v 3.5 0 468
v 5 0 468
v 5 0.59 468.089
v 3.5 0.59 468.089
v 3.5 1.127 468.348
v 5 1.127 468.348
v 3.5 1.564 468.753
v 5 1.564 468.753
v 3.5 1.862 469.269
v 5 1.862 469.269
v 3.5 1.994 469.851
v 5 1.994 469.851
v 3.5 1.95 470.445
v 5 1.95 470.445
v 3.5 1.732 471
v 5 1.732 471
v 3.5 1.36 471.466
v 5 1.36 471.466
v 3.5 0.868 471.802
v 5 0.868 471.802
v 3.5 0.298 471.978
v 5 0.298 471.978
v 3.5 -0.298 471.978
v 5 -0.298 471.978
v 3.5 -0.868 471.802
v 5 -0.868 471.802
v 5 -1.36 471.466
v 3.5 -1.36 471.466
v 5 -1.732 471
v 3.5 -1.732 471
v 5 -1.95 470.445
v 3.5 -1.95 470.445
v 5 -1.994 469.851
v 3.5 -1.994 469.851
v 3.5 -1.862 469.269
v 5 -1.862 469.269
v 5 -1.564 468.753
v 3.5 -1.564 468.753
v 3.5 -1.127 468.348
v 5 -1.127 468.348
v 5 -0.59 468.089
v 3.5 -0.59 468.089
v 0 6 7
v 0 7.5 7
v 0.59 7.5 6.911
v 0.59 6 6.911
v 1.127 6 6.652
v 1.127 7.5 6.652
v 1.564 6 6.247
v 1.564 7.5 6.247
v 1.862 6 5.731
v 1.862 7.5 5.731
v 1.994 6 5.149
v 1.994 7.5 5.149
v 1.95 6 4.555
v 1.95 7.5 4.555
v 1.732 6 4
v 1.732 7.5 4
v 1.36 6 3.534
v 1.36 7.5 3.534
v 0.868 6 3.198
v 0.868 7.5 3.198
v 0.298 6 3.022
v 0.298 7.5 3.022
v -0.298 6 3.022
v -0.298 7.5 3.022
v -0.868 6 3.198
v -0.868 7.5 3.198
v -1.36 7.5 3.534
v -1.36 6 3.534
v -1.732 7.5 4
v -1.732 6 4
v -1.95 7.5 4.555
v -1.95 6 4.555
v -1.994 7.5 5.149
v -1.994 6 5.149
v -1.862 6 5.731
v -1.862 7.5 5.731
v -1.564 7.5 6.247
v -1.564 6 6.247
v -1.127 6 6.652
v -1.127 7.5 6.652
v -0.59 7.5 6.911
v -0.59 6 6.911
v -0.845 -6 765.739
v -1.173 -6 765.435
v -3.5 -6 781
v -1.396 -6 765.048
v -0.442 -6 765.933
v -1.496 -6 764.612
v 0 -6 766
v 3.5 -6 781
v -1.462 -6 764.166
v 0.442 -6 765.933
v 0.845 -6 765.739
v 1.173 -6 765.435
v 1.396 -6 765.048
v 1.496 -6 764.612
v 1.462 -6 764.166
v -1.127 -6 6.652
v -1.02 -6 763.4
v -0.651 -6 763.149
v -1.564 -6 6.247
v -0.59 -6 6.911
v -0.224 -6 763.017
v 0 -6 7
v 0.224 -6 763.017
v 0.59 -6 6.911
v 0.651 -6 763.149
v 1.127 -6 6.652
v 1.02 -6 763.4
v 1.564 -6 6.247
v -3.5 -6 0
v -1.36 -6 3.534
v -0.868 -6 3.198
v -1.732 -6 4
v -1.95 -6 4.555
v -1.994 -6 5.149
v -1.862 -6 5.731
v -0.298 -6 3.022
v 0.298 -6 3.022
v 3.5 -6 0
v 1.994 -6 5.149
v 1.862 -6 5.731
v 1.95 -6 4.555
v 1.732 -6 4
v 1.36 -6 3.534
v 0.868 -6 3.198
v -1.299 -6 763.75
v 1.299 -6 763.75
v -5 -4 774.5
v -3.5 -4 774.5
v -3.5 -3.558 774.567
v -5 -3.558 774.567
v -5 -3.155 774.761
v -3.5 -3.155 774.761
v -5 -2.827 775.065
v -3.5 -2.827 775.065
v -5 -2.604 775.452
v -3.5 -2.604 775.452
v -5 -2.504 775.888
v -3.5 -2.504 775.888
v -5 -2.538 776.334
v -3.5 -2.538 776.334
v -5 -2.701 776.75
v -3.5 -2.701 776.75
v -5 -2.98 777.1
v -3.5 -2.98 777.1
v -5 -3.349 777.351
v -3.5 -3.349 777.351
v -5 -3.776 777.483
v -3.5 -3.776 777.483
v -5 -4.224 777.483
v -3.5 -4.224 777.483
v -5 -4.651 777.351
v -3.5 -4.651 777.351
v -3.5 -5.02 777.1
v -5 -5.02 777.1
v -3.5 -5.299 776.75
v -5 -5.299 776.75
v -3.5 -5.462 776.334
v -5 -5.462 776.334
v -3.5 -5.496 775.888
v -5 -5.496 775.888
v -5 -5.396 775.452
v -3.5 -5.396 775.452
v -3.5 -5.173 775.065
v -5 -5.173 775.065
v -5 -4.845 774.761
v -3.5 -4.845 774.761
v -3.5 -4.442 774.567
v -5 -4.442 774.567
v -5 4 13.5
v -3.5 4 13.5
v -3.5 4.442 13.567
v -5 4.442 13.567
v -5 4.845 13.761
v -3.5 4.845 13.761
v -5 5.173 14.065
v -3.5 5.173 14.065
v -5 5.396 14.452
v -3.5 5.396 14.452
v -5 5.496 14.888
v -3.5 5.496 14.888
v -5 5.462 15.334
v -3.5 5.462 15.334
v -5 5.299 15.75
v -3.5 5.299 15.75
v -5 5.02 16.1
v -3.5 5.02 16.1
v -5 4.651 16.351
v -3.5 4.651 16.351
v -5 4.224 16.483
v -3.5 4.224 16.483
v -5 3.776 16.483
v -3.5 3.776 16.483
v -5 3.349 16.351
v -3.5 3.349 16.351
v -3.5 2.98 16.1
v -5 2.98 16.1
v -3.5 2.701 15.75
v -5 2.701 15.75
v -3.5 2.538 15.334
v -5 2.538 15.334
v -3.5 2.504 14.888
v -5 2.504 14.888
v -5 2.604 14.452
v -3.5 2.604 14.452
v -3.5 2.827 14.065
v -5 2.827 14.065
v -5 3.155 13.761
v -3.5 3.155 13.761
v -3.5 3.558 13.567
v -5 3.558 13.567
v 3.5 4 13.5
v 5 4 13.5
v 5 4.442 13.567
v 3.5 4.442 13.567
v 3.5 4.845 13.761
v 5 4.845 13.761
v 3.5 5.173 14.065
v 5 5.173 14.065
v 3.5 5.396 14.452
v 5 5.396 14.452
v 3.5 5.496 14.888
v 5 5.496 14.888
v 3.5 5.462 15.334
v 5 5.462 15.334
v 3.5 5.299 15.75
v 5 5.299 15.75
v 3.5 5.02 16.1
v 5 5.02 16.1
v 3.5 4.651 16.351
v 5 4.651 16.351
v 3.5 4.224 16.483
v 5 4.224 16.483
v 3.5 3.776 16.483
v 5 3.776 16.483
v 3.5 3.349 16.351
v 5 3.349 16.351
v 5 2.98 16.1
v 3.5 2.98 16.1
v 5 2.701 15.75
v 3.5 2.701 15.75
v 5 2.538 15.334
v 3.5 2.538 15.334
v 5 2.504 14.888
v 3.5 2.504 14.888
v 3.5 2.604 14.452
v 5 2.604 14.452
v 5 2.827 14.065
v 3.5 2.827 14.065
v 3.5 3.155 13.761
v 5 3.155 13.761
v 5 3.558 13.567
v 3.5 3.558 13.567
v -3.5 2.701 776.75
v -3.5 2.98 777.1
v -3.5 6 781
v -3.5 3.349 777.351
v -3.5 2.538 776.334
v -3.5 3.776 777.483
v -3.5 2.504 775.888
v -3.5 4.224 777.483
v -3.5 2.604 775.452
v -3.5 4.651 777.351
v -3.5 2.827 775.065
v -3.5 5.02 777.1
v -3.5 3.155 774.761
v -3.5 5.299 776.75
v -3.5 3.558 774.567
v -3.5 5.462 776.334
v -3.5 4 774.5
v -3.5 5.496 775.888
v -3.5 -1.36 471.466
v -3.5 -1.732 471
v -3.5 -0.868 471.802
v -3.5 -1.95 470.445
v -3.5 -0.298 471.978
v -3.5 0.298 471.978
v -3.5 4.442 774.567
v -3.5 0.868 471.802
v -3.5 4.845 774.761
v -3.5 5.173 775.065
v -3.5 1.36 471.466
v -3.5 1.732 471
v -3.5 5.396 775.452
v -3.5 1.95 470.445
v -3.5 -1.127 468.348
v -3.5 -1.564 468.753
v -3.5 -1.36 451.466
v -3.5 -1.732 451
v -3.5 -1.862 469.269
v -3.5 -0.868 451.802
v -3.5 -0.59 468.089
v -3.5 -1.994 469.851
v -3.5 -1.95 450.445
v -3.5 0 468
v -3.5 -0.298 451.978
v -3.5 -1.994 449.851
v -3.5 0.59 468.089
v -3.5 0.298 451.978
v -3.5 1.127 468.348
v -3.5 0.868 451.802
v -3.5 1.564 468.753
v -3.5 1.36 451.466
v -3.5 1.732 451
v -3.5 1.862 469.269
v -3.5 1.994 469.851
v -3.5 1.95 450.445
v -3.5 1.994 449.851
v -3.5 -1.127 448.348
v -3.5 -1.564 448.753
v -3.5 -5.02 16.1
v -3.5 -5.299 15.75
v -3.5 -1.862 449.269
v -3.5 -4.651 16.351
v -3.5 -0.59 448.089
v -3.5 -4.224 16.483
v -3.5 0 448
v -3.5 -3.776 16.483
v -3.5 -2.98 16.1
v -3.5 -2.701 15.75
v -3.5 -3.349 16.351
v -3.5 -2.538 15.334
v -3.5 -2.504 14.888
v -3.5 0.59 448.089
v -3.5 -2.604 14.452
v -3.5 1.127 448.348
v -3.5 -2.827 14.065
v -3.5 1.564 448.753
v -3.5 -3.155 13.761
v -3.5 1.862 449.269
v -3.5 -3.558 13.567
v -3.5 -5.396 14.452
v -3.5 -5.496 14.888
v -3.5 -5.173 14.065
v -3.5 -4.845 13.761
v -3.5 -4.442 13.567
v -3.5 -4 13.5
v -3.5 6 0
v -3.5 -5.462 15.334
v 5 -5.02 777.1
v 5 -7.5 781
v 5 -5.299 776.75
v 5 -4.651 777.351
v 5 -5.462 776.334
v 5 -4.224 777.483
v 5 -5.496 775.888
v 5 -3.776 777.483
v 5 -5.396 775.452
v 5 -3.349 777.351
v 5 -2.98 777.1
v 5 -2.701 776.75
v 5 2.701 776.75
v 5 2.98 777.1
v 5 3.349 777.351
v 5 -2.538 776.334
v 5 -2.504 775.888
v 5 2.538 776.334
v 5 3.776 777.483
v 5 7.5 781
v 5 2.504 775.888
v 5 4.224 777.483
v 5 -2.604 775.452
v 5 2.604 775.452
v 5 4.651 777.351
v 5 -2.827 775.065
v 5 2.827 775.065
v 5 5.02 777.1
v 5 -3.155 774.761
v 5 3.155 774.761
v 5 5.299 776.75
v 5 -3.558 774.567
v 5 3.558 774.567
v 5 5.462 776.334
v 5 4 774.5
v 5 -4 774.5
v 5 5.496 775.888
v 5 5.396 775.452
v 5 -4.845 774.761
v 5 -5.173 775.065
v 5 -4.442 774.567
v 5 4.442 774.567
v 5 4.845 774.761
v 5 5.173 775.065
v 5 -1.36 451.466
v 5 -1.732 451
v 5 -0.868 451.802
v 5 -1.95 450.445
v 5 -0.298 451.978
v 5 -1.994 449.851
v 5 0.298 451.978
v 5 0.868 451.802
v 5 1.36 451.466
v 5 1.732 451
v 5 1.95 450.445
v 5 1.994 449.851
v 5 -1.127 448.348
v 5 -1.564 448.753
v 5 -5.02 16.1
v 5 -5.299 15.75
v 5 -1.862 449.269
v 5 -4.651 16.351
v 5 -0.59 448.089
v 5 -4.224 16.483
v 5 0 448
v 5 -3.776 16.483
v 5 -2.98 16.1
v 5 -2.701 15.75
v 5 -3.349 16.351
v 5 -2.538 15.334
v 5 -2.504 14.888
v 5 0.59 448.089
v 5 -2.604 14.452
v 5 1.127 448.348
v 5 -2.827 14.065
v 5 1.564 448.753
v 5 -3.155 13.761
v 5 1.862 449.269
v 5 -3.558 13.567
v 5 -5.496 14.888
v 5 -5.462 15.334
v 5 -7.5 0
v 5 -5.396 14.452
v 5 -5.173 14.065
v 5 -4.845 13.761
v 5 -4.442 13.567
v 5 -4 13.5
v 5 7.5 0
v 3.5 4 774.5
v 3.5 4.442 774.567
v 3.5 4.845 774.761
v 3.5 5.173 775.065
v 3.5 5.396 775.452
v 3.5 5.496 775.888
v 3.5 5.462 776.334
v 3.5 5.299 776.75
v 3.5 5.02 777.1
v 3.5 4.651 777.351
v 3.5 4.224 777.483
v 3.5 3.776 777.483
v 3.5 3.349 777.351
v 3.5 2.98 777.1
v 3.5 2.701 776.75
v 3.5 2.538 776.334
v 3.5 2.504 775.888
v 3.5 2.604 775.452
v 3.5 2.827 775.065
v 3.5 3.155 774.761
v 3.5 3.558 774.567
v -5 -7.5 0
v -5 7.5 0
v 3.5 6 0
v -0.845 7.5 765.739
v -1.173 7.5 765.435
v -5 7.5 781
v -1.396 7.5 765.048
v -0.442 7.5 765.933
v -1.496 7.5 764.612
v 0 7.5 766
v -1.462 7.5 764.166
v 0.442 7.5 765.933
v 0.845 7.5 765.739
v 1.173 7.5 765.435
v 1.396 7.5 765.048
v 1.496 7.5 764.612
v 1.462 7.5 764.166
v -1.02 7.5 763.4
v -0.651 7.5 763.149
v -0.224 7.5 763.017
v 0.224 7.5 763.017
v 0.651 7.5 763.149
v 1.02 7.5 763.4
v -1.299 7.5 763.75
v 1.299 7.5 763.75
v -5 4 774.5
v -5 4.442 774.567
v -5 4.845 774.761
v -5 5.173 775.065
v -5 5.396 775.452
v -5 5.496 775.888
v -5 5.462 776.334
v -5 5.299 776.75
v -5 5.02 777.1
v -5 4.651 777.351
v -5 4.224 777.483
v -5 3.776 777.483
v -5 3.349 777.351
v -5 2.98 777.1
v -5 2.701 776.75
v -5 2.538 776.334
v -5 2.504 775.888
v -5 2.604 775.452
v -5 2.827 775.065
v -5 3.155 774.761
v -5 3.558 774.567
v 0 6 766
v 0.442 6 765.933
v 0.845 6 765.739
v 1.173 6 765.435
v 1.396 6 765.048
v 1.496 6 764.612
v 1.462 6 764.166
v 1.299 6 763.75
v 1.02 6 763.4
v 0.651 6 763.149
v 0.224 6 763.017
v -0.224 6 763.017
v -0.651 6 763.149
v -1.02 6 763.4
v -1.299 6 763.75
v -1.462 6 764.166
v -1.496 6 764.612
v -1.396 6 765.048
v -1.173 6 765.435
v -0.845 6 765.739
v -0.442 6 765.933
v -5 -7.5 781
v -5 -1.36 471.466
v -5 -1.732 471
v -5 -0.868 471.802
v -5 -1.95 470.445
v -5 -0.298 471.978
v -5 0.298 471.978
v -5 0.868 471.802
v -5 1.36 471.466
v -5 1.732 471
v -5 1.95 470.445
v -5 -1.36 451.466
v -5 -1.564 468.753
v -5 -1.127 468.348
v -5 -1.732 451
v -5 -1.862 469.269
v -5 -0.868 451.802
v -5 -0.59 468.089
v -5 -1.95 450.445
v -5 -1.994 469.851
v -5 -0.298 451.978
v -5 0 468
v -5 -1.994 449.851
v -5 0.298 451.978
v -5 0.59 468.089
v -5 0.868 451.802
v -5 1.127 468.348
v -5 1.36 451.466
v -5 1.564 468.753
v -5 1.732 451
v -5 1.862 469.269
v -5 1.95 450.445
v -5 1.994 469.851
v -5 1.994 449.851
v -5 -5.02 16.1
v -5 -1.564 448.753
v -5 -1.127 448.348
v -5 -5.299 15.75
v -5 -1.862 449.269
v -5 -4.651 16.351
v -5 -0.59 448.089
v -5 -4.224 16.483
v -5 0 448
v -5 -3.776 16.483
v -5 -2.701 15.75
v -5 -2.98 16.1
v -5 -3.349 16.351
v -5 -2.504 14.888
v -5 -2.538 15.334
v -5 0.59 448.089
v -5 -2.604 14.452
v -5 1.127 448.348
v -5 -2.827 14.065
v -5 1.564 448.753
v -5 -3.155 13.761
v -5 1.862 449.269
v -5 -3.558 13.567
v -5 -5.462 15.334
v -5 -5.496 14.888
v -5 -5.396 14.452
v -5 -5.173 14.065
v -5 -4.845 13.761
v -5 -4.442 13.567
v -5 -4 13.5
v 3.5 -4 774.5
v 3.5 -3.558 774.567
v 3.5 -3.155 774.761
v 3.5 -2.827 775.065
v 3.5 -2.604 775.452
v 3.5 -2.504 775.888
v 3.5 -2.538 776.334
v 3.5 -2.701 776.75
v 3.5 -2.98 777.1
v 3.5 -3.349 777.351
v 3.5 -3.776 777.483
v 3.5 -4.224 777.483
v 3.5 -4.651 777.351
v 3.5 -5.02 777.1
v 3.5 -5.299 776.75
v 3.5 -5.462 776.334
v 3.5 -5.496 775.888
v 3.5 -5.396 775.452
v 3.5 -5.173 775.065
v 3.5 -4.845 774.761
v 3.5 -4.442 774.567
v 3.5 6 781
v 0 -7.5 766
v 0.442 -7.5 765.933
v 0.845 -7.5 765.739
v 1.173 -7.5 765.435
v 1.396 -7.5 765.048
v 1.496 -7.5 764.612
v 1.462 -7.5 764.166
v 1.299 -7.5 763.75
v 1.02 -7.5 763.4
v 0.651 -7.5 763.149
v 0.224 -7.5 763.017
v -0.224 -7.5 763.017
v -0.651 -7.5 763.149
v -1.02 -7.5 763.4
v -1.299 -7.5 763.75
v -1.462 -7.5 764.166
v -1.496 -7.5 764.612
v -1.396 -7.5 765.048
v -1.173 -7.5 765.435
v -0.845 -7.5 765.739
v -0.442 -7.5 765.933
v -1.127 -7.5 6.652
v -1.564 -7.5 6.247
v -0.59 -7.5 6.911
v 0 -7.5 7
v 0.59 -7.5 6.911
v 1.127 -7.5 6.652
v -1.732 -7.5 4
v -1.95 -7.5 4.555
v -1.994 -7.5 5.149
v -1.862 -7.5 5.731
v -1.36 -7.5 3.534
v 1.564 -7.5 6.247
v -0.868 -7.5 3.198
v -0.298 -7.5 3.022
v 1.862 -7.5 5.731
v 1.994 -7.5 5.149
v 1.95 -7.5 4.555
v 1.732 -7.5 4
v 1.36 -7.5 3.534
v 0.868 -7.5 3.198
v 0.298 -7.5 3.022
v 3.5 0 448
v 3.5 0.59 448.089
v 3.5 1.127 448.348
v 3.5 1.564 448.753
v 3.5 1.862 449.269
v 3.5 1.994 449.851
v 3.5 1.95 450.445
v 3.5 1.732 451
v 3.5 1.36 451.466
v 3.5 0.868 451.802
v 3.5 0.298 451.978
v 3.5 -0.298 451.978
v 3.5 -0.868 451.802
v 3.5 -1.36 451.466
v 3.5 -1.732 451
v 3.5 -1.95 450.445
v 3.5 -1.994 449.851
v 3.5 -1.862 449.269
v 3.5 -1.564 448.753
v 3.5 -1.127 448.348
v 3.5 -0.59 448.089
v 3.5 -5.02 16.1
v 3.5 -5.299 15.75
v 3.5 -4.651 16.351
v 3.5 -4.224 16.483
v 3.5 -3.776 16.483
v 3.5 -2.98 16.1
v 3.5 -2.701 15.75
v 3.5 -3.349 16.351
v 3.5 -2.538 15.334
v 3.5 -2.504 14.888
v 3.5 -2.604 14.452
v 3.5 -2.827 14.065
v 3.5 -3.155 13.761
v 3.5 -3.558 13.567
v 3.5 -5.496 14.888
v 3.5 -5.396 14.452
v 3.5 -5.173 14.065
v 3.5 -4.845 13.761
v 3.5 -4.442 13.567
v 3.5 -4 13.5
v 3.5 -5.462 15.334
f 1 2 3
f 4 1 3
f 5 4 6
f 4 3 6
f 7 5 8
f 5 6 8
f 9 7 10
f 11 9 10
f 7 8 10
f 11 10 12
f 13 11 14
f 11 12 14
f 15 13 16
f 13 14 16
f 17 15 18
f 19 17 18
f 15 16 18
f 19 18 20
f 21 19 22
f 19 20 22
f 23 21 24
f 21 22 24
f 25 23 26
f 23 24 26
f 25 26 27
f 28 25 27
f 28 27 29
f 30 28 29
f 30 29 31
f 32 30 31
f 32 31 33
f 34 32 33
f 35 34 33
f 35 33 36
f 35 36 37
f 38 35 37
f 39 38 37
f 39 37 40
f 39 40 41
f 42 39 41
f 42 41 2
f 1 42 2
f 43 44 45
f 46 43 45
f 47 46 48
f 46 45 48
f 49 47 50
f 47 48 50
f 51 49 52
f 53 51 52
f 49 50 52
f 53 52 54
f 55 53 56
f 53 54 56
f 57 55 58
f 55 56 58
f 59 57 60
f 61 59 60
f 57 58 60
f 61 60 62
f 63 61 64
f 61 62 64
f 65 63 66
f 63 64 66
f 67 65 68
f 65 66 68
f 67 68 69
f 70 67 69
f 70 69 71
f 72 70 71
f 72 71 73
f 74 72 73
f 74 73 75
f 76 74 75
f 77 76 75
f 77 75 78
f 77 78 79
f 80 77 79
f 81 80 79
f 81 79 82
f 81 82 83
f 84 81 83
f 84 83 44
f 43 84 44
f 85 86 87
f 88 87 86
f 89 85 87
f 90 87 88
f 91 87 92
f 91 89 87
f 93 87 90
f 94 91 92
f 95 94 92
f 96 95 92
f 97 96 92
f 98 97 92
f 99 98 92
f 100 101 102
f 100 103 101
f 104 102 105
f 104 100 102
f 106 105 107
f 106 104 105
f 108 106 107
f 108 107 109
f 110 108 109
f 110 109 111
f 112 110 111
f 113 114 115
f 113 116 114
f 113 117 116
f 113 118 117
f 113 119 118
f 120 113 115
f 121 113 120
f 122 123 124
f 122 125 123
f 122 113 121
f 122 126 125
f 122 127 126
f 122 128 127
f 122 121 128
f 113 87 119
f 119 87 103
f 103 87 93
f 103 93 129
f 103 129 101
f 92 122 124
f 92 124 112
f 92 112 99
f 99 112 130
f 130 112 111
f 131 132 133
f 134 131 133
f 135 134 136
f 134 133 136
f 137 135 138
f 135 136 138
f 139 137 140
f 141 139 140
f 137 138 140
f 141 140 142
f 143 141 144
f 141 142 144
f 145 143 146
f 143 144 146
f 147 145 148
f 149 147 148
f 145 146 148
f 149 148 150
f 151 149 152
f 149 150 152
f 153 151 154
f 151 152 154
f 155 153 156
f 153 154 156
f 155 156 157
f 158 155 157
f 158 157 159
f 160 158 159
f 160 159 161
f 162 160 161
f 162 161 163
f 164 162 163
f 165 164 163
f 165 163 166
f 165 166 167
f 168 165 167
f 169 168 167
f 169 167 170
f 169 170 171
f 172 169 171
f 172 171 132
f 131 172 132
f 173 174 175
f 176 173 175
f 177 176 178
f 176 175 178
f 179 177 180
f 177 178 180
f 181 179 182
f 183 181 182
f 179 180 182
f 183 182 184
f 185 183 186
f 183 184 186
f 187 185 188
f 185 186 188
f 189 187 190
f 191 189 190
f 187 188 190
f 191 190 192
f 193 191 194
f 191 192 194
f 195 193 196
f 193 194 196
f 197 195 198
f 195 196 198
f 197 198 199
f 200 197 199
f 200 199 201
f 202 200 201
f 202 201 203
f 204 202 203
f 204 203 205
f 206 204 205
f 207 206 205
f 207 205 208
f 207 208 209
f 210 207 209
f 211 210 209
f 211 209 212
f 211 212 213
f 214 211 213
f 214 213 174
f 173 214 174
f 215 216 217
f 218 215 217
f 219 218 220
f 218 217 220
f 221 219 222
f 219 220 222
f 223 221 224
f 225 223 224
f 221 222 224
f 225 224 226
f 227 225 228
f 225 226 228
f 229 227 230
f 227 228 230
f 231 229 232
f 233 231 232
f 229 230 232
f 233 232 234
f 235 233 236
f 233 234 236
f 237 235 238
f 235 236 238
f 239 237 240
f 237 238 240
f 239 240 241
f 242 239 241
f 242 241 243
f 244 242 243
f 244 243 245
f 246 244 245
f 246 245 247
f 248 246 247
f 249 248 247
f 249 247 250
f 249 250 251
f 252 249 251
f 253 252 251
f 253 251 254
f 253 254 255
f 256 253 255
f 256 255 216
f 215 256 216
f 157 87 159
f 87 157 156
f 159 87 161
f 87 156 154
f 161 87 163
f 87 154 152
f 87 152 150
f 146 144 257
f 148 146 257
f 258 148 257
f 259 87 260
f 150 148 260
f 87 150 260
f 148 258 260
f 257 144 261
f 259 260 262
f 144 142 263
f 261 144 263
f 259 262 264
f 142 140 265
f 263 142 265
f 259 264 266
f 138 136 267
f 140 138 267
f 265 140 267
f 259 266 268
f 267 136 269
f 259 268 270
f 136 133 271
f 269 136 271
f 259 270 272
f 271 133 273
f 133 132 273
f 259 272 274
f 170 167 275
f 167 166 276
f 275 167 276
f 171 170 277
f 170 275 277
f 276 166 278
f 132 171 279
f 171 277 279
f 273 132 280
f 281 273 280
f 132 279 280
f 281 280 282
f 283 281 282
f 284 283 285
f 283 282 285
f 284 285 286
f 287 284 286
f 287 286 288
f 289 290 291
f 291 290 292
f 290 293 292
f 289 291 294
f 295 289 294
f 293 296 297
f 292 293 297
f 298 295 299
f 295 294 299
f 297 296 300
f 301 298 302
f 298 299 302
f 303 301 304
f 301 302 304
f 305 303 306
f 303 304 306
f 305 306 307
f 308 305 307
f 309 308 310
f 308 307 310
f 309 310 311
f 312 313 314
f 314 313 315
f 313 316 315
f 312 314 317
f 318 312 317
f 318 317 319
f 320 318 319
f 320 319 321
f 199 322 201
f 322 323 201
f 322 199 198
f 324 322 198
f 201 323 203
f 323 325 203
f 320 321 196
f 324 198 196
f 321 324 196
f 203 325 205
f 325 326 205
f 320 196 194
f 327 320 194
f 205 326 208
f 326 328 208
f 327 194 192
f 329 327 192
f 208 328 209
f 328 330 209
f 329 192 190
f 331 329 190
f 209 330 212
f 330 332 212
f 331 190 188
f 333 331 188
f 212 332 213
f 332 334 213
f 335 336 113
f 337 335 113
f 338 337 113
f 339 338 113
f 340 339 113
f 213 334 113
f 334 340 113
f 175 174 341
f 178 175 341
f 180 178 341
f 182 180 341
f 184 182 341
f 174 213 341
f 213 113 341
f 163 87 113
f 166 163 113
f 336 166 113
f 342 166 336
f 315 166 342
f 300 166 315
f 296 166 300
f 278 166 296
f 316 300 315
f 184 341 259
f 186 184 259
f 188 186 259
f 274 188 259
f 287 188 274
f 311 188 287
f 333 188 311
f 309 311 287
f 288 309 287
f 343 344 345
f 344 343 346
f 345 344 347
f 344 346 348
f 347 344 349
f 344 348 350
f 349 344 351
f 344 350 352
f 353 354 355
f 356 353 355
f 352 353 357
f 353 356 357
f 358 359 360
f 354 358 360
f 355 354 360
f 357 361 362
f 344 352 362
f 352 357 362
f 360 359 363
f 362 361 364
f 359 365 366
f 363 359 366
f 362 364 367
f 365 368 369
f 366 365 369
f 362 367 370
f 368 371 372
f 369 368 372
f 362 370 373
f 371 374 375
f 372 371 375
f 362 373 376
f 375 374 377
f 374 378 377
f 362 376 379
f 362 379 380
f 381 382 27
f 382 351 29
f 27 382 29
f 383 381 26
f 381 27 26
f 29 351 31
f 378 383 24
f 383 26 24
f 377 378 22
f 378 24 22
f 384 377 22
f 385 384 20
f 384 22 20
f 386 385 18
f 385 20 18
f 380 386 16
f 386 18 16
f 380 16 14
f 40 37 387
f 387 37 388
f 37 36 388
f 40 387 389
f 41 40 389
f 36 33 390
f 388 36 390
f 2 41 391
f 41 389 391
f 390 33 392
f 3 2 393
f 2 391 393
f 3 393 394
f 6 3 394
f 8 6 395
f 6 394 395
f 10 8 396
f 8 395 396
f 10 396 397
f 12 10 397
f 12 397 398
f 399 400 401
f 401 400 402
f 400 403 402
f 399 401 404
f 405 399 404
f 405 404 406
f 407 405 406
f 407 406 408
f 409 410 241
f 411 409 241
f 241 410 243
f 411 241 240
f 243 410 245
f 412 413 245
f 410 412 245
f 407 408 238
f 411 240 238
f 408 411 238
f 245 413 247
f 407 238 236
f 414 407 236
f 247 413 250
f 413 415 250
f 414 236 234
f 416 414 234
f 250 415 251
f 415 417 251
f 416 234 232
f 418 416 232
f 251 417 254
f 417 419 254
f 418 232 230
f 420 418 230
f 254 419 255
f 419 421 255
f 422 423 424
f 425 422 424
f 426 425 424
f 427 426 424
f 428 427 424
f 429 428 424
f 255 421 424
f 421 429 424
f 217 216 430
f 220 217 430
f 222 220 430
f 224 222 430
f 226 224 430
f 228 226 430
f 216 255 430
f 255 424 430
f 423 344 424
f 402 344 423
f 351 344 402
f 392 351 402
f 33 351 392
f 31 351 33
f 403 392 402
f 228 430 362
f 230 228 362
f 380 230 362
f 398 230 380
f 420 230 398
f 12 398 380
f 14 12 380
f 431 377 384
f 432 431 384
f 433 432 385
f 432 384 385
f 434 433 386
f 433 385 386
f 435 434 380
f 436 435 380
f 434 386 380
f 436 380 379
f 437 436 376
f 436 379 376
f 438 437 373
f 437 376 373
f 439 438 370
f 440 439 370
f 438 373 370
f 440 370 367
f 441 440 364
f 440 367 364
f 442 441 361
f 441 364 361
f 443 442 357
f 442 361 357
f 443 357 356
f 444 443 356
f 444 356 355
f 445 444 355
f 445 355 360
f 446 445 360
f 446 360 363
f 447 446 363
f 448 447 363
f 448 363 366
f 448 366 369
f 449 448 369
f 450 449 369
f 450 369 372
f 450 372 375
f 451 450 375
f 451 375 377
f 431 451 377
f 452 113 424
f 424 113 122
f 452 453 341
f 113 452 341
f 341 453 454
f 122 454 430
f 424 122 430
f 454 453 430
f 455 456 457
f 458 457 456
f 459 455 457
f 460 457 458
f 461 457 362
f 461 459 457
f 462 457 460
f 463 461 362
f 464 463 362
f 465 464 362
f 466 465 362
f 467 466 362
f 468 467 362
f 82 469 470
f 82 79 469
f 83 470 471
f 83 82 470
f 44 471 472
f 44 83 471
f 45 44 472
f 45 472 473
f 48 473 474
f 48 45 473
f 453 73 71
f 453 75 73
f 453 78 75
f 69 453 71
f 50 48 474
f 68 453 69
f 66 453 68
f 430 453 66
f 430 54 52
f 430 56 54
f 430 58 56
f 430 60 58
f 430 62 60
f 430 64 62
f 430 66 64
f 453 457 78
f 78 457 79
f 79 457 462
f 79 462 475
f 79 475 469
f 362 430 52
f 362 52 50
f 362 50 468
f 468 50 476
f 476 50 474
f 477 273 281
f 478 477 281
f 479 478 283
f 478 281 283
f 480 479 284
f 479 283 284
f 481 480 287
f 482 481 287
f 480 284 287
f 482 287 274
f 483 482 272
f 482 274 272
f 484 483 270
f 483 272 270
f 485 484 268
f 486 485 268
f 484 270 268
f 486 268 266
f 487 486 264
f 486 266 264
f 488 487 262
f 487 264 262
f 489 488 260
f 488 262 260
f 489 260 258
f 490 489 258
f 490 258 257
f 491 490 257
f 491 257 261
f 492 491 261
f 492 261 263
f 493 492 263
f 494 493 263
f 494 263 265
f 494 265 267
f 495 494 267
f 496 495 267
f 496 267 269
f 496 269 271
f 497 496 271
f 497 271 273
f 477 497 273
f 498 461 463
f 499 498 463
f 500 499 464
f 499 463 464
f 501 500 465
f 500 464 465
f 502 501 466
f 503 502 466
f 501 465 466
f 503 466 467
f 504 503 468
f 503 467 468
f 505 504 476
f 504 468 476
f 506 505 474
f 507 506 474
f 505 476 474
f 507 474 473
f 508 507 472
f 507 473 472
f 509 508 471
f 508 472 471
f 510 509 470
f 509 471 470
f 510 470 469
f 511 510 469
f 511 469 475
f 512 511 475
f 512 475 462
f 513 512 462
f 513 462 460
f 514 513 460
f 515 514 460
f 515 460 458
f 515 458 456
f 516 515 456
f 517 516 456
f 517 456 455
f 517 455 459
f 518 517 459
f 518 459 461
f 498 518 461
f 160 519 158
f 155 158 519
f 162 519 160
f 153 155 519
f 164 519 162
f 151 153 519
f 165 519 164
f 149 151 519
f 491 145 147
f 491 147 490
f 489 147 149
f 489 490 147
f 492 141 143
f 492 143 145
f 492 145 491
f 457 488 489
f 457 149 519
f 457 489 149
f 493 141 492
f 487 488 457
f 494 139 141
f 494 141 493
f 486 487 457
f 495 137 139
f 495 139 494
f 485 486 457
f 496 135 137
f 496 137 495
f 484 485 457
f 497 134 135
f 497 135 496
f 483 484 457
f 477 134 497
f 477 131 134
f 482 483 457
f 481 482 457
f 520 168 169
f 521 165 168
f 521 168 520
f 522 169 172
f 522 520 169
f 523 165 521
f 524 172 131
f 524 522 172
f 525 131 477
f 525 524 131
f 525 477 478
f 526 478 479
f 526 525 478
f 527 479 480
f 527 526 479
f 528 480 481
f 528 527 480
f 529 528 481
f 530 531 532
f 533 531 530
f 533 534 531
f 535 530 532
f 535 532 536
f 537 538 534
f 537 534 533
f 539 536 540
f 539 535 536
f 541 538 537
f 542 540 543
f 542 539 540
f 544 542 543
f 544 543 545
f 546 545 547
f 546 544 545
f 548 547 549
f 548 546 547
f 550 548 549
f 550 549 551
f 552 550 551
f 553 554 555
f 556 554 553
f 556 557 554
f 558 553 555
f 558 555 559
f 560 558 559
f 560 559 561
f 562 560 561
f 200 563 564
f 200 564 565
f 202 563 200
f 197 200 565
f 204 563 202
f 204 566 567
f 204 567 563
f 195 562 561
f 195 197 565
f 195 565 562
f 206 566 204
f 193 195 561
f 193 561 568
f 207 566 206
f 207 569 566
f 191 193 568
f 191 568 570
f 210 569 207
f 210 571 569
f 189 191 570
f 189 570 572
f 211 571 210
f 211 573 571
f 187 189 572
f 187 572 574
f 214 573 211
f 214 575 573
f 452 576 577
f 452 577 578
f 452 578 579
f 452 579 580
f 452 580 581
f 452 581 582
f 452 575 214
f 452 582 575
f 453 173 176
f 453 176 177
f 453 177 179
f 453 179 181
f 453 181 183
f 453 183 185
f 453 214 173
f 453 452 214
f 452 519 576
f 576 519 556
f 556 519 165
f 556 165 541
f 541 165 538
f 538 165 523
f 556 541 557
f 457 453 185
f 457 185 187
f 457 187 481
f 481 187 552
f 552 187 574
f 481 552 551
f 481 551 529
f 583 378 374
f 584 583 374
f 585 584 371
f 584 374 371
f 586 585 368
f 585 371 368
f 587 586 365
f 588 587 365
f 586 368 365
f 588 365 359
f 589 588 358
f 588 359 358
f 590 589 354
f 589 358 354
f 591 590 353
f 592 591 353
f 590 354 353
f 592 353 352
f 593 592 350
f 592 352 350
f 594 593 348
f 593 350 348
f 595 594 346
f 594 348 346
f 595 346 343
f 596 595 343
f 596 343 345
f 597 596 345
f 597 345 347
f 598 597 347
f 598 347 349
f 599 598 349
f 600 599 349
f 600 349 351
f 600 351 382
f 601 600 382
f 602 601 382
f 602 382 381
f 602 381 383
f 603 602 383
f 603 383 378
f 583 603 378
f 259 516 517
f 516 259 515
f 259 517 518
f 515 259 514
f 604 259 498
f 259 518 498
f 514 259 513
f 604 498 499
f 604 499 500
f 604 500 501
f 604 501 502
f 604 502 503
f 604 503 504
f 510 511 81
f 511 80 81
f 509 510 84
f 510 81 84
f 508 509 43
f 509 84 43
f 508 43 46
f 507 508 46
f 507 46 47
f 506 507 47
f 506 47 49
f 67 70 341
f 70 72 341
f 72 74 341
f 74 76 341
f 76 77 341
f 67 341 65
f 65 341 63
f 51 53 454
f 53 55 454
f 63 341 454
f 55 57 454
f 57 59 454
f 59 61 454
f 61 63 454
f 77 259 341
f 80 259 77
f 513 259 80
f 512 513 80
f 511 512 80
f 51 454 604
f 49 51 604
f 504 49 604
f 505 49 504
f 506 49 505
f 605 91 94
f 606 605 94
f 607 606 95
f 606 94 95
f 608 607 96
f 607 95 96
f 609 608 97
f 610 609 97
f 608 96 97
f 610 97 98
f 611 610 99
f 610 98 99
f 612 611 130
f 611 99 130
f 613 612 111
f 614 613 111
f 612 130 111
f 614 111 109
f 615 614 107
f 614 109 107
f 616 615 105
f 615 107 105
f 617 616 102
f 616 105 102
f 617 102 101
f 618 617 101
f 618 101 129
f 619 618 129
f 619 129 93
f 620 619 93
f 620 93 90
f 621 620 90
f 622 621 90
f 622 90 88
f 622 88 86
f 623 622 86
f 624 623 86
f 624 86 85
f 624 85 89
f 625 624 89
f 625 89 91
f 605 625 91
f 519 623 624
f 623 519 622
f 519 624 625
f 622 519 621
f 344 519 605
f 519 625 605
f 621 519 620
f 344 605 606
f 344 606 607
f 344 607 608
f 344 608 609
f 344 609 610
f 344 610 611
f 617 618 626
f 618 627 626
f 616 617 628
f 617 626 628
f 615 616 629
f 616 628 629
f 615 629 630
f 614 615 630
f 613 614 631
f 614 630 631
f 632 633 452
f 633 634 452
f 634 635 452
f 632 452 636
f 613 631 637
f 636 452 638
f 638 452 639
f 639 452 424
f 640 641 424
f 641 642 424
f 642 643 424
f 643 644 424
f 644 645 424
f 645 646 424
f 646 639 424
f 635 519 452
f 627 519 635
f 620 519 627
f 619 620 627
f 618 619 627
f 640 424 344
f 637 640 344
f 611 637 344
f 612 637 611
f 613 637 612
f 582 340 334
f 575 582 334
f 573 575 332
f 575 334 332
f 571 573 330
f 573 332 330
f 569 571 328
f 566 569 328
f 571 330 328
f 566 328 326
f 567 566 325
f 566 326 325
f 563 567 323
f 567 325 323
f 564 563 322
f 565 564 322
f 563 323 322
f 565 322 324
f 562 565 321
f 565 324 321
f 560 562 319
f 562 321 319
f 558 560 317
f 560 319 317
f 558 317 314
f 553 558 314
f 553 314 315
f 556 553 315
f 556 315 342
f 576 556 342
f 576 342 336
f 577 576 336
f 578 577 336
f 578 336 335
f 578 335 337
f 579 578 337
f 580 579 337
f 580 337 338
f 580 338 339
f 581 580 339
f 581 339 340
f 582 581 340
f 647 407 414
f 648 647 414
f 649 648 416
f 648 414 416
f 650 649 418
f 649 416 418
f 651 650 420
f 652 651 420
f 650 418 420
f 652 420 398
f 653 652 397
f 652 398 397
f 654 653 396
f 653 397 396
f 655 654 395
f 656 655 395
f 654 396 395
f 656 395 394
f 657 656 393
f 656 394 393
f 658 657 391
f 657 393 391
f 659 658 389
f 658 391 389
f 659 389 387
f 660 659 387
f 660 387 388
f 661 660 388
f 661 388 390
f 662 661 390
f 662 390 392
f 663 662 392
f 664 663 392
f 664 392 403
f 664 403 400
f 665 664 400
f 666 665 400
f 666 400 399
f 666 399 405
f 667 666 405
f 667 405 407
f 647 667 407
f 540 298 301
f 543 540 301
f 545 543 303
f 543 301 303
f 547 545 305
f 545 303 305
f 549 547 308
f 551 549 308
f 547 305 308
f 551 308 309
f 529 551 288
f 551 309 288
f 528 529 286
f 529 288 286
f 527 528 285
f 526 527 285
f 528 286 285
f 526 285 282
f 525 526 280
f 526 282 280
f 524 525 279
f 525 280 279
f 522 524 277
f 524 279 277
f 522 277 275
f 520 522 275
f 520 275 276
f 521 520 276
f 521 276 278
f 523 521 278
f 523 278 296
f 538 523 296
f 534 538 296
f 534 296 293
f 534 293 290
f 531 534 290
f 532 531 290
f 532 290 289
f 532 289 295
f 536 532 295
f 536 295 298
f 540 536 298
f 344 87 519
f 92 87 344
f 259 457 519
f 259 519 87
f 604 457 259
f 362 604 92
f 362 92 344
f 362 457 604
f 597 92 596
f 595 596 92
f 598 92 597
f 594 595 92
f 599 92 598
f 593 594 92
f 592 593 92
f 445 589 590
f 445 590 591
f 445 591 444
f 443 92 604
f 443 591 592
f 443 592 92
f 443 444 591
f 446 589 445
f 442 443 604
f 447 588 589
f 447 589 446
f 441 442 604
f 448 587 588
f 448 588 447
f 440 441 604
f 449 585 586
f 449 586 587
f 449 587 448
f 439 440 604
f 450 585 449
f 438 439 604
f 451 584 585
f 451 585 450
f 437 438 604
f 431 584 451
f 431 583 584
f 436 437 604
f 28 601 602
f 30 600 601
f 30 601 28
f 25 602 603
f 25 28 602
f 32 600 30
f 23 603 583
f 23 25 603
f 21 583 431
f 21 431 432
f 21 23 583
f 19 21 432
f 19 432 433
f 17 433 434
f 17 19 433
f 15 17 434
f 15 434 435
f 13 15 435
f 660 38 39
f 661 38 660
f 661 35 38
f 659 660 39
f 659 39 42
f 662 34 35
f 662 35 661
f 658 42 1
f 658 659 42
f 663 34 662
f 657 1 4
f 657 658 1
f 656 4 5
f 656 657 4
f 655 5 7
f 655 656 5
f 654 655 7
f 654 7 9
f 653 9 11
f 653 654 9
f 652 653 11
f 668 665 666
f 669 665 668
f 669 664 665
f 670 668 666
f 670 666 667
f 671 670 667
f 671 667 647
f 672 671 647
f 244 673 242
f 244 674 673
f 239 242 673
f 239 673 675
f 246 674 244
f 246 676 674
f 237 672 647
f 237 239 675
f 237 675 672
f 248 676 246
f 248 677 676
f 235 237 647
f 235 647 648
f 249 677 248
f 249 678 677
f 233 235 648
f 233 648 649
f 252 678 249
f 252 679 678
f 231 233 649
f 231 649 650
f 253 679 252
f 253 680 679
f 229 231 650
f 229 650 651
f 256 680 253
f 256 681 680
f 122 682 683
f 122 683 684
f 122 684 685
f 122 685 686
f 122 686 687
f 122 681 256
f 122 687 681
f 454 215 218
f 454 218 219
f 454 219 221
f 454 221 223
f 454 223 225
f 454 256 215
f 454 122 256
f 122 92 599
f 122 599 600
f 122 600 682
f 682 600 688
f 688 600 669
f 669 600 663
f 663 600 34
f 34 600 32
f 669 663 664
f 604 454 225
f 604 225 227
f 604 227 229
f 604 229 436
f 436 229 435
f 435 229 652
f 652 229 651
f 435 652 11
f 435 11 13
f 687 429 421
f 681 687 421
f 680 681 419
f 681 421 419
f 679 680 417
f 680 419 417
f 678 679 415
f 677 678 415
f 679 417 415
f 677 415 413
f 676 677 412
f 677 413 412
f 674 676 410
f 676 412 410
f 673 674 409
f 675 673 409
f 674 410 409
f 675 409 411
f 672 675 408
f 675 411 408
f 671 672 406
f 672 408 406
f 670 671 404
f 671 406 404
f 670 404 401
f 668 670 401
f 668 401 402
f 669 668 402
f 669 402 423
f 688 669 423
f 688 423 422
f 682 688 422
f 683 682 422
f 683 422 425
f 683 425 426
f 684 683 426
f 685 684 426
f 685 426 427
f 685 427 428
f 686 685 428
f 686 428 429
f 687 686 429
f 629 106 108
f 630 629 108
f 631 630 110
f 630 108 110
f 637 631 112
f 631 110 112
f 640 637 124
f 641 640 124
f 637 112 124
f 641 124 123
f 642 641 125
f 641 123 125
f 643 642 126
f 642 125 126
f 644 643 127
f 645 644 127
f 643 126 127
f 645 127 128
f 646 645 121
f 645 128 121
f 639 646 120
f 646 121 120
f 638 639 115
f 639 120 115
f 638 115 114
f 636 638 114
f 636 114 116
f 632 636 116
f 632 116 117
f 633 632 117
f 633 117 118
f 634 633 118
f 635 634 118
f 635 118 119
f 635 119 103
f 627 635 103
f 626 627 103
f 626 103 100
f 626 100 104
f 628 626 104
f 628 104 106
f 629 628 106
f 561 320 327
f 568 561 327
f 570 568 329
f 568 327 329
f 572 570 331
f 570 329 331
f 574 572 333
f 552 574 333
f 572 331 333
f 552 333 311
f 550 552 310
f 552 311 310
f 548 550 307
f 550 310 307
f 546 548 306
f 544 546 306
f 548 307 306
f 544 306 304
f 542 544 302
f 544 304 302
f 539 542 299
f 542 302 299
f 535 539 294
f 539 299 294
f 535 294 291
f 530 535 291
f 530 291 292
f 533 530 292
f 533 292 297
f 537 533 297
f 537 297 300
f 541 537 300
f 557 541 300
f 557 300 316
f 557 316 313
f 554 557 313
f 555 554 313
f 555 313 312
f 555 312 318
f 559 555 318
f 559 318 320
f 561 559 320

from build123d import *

# Parameters (mm, degrees)
SKETCH_1_W          = 10
SKETCH_1_H          = 15
SKETCH_1_W_2        = 7
SKETCH_1_H_2        = 12
EXTRUDE_1_DEPTH     = 781
SKETCH_2_R          = 2
SKETCH_2_R_2        = 1.5
CUT_EXTRUDE_1_DEPTH = 782.100025605
SKETCH_3_R          = 2
SKETCH_3_R_2        = 1.5
CUT_EXTRUDE_2_DEPTH = 782.16003482


with BuildPart() as part:
    # ｽｹｯﾁ1 → 押し出し-薄板1 (new body)
    with BuildSketch(Plane.XY):
        Rectangle(SKETCH_1_W, SKETCH_1_H)
        Rectangle(SKETCH_1_W_2, SKETCH_1_H_2, mode=Mode.SUBTRACT)
    extrude(amount=EXTRUDE_1_DEPTH)

    # ｽｹｯﾁ2 → ｶｯﾄ - 押し出し1 (cut, through all)
    with BuildSketch(Plane(origin=(5, 0, 0), x_dir=(0, 0, -1), z_dir=(1, 0, 0))):
        with Locations((-470, 0)):
            Circle(SKETCH_2_R)
        with Locations((-450, 0)):
            Circle(SKETCH_2_R)
        with Locations((-15, 4)):
            Circle(SKETCH_2_R_2)
        with Locations((-15, -4)):
            Circle(SKETCH_2_R_2)
        with Locations((-776, 4)):
            Circle(SKETCH_2_R_2)
        with Locations((-776, -4)):
            Circle(SKETCH_2_R_2)
    extrude(amount=-CUT_EXTRUDE_1_DEPTH, mode=Mode.SUBTRACT)

    # ｽｹｯﾁ3 → ｶｯﾄ - 押し出し2 (cut, through all)
    with BuildSketch(Plane(origin=(0, 7.5, 0), x_dir=(1, 0, 0), z_dir=(0, 1, 0))):
        with Locations(Location((0, -5, 0), (0, 0, 270))):
            Circle(SKETCH_3_R)
        with Locations(Location((0, -764.5, 0), (0, 0, 270))):
            Circle(SKETCH_3_R_2)
    extrude(amount=-CUT_EXTRUDE_2_DEPTH, mode=Mode.SUBTRACT)


solid = part.part
